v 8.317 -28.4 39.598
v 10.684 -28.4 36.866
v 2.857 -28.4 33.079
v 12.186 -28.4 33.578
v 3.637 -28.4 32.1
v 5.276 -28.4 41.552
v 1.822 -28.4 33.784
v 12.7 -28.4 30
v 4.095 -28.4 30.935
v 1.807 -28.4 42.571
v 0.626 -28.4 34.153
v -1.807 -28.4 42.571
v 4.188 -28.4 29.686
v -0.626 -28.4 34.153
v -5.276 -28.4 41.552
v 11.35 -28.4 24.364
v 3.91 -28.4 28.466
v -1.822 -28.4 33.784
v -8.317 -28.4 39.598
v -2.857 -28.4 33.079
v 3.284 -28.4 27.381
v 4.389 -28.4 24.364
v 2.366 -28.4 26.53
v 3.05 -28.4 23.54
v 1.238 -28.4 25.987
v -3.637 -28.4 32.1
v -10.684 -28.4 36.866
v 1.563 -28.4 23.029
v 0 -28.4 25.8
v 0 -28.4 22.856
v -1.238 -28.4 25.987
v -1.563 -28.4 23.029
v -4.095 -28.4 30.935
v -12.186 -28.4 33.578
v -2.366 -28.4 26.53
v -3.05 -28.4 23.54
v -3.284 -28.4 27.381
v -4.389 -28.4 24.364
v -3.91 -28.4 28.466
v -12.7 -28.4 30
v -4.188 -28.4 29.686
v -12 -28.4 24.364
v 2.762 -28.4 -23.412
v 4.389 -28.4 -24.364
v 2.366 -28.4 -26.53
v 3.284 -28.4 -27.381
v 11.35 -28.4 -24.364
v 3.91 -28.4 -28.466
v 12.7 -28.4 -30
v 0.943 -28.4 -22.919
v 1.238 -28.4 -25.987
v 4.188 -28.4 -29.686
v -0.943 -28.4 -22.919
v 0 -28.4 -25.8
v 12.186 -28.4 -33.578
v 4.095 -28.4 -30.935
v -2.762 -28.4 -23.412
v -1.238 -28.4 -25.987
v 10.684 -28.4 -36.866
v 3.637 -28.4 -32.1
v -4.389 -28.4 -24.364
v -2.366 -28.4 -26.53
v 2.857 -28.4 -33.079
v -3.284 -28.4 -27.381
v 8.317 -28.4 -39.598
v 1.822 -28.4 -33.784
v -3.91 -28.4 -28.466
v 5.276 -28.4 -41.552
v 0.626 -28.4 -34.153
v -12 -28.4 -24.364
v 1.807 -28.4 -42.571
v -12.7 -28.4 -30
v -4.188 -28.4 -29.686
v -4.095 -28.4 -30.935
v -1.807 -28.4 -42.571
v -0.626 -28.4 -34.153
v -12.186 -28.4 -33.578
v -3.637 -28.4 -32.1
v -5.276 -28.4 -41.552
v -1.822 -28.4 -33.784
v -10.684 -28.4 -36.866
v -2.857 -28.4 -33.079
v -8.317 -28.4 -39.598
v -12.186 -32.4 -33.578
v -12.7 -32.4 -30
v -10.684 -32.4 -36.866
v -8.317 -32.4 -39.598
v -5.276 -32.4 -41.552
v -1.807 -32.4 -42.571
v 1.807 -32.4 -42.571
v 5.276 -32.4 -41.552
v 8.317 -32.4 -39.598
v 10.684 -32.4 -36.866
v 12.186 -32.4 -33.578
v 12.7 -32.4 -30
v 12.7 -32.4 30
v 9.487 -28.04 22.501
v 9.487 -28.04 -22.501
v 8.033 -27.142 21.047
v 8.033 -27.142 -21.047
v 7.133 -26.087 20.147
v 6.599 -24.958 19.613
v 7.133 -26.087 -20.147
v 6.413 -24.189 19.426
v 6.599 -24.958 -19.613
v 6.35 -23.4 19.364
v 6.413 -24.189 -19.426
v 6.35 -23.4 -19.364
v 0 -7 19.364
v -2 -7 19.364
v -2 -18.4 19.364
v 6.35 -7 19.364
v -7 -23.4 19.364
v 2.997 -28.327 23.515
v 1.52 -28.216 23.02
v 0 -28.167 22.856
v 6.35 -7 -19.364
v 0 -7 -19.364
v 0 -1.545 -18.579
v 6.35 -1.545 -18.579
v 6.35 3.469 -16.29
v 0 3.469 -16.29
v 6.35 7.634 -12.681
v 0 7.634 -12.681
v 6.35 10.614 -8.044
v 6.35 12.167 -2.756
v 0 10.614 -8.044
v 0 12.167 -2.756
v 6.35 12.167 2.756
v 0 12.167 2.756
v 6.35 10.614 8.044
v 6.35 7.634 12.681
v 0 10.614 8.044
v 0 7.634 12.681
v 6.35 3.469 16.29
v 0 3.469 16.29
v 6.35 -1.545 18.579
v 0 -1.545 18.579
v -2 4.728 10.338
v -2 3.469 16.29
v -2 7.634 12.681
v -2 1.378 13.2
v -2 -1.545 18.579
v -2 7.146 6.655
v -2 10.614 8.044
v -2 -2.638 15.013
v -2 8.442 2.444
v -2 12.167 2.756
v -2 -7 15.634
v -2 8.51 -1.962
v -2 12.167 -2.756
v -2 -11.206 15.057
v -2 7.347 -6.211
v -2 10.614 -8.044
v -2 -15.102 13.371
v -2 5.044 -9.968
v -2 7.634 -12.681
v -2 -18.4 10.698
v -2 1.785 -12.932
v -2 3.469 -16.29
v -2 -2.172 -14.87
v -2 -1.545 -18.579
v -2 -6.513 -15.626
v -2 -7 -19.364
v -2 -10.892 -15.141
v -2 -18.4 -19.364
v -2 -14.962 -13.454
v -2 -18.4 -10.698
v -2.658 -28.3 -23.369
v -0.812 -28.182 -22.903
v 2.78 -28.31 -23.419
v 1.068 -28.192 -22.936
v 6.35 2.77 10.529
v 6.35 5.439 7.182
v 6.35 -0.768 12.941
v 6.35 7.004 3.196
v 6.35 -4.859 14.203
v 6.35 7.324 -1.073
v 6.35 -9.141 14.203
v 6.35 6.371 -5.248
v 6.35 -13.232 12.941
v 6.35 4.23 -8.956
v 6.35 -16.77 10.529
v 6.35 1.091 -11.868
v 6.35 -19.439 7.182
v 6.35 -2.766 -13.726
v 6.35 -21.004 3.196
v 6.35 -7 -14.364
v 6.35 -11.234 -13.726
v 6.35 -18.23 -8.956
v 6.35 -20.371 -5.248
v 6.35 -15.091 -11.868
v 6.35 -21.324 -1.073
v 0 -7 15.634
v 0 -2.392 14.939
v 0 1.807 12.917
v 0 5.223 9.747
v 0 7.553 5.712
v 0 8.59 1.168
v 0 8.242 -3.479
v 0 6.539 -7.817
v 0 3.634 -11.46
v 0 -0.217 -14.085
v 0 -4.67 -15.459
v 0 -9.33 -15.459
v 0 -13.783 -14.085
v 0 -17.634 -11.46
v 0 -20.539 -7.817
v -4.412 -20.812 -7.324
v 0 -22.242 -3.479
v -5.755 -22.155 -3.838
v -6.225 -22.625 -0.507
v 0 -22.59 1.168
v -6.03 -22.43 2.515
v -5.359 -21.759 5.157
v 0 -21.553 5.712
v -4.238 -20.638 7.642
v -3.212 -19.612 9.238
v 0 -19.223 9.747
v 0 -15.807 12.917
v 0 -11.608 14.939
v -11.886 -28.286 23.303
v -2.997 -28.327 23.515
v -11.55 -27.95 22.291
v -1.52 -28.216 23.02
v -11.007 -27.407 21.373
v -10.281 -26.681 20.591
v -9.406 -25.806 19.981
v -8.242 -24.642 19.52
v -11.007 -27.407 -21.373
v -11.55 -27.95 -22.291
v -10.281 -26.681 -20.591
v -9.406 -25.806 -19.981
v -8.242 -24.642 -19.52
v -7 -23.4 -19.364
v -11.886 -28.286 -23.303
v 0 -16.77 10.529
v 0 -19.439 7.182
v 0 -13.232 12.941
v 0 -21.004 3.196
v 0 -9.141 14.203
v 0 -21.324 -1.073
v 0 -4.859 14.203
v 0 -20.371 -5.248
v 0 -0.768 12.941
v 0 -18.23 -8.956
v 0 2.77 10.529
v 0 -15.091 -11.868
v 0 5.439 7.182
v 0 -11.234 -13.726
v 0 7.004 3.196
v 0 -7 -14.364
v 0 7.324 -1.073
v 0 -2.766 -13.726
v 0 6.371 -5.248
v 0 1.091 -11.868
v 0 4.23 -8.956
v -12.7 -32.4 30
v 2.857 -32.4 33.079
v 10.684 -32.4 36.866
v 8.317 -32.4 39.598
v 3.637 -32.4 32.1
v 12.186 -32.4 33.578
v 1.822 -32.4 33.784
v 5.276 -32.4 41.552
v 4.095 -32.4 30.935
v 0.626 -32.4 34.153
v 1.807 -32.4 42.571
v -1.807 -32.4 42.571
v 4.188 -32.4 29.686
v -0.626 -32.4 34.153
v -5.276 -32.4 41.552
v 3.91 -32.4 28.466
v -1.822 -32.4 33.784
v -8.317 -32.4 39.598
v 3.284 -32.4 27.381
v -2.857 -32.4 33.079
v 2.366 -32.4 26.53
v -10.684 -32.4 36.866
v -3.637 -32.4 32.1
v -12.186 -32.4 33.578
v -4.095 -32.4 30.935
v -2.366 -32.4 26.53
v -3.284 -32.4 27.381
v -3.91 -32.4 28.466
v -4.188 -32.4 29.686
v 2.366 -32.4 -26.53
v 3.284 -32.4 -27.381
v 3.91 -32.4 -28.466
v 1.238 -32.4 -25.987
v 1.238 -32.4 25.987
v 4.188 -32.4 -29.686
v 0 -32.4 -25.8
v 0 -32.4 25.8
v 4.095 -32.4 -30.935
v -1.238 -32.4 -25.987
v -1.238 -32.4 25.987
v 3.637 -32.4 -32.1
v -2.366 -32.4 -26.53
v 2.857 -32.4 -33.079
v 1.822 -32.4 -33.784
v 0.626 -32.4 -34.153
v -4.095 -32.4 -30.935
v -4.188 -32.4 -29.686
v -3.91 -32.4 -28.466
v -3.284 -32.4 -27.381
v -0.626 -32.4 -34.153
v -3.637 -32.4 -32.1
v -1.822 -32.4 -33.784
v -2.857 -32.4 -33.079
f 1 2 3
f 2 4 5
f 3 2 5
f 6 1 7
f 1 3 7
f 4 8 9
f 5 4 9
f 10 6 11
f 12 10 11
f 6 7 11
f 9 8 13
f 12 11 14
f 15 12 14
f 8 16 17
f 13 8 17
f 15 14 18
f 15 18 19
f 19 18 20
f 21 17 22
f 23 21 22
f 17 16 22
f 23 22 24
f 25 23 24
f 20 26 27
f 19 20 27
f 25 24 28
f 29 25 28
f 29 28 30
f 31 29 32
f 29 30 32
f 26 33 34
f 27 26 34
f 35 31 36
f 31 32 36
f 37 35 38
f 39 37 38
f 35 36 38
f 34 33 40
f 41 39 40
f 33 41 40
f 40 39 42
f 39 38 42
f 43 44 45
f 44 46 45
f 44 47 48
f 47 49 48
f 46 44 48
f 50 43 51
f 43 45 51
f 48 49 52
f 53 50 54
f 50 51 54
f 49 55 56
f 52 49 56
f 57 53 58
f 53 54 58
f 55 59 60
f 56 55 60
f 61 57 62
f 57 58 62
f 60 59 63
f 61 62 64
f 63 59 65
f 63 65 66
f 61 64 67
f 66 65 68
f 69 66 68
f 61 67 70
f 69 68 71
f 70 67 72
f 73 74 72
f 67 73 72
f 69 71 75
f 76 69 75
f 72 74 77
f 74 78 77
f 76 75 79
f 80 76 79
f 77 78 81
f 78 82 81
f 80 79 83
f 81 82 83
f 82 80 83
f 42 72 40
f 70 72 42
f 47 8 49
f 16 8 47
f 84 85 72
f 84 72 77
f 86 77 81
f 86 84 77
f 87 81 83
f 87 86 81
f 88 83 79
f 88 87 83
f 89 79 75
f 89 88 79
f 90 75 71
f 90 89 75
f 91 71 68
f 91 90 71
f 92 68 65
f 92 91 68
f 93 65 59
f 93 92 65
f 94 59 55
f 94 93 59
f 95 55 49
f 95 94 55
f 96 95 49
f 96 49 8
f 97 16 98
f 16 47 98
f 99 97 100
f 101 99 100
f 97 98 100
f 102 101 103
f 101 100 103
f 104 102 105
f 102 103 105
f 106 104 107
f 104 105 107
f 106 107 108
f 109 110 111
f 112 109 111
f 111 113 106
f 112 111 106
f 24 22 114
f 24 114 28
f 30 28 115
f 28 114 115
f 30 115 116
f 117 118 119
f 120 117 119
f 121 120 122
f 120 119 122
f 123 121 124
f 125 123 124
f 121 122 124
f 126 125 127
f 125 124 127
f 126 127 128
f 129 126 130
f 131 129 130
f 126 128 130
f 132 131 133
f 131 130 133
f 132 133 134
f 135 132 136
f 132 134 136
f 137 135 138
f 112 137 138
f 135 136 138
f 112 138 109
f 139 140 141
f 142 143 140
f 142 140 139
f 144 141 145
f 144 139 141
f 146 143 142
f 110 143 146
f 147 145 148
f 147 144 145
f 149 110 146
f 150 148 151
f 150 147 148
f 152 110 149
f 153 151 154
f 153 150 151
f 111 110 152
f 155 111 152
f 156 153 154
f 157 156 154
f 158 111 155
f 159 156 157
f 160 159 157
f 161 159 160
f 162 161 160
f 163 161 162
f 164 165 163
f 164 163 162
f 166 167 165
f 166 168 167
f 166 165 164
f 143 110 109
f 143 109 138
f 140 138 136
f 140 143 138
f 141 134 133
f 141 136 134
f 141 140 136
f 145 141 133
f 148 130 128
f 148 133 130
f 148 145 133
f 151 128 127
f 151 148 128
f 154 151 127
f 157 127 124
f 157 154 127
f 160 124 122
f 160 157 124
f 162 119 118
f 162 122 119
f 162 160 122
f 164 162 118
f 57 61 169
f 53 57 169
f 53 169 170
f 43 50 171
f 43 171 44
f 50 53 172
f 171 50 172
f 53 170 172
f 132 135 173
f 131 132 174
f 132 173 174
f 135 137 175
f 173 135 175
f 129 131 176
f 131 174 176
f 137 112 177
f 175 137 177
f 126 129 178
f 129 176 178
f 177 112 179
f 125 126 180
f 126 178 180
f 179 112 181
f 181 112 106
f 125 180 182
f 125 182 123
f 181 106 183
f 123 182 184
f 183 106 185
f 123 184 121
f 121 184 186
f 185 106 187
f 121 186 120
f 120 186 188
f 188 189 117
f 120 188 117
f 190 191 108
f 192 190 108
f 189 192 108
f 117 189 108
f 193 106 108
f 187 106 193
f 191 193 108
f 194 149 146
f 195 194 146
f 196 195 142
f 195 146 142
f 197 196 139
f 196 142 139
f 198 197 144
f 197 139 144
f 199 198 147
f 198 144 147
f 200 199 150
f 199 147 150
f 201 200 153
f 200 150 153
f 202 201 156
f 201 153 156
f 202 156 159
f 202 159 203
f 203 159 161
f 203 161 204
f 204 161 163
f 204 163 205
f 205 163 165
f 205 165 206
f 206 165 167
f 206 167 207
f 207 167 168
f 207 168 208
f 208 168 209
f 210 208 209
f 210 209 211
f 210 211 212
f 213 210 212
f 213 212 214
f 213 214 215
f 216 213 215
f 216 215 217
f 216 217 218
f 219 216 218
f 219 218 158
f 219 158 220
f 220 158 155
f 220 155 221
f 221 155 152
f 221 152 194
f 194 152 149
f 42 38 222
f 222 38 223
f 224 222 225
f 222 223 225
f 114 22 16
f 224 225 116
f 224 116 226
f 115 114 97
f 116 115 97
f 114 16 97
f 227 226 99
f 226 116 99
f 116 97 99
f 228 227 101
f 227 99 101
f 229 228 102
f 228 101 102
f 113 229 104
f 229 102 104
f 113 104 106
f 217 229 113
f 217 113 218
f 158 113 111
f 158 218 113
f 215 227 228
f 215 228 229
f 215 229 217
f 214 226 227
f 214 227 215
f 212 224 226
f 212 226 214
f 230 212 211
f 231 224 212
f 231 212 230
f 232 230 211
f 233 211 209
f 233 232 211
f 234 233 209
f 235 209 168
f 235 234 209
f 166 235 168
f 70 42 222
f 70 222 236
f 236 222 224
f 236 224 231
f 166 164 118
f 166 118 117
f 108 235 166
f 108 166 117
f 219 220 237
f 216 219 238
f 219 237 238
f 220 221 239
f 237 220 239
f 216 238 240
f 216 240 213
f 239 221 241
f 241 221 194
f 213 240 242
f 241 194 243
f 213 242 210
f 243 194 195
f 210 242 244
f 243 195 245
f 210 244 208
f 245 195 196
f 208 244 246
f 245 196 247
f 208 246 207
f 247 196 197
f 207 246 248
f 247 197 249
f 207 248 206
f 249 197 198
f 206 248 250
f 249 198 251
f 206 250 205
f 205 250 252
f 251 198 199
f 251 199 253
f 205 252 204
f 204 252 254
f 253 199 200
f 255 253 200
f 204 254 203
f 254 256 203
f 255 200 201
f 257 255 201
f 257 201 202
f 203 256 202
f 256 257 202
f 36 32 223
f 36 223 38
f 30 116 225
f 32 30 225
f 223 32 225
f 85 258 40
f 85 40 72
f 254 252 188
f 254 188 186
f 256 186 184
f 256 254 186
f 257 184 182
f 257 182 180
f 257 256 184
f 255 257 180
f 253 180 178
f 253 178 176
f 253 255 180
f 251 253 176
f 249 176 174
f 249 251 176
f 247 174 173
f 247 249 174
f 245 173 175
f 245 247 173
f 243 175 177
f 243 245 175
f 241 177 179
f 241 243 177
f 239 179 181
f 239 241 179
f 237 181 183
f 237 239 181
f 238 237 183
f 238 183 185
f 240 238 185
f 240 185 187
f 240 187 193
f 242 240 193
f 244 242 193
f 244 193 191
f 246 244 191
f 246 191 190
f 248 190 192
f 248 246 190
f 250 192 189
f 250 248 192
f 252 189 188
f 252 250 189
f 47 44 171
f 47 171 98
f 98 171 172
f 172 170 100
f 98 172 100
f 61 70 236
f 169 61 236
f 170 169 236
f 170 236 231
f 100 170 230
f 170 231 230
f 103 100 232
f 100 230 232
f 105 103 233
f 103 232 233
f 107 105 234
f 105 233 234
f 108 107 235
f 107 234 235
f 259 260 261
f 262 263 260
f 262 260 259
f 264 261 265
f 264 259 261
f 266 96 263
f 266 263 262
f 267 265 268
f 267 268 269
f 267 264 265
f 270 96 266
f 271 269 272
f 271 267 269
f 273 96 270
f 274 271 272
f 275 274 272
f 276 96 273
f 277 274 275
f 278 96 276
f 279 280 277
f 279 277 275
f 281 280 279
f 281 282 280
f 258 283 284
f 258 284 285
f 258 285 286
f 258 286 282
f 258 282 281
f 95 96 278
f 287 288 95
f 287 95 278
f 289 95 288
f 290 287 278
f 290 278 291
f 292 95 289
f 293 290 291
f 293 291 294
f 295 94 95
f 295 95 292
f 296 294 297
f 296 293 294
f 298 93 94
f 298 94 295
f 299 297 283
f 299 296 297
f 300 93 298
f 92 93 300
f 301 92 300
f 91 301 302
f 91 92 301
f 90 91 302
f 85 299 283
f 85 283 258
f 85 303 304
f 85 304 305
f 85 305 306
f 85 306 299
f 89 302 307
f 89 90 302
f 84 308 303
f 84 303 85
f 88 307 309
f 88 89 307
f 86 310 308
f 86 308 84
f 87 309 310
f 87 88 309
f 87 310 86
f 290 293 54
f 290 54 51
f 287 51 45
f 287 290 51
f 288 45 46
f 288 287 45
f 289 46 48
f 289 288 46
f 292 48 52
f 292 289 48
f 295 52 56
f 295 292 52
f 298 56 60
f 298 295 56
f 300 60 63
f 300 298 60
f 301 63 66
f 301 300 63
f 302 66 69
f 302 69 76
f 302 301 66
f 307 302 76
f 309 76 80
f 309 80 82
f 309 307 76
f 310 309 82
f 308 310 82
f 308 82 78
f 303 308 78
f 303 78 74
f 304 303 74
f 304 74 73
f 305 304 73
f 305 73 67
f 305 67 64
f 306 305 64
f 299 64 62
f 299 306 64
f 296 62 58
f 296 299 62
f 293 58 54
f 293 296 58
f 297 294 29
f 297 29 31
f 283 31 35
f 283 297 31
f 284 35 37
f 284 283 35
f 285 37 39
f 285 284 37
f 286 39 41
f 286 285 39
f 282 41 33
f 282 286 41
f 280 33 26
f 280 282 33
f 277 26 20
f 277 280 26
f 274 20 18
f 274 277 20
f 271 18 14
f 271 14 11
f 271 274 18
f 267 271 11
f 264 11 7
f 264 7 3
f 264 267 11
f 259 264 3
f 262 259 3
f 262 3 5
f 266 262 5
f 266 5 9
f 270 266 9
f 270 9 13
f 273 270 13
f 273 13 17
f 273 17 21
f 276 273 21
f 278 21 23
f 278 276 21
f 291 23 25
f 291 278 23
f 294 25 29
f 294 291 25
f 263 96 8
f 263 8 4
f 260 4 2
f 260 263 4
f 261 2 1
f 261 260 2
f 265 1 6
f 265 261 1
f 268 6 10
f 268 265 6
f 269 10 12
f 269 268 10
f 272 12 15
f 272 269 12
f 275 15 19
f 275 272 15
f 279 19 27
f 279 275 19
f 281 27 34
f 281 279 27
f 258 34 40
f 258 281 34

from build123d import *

# Parameters (mm, degrees)
SKETCH1_R                          = 19.3637
SKETCH1_R_2                        = 14.3637
MOTOR_FACE_AND_SCREW_EXTRUDE_DEPTH = 6.35
BOSS_EXTRUDE4_START                = 2
SKETCH7_R                          = 19.3637
SKETCH7_R_2                        = 15.6337
BOSS_EXTRUDE4_DEPTH                = 2
SKETCH3_R                          = 4.2
BOSS_EXTRUDE3_DEPTH                = 4
BOSS_EXTRUDE5_REACH                = 62.384
BOSS_EXTRUDE5_END_RADIUS           = 19.3637
SKETCH8_W                          = 8.35
SKETCH8_H                          = 38.7274
CHAMFER1_SIZE                      = 10
FILLET1_R                          = 5
SKETCH6_W                          = 7.14375
SKETCH6_H                          = 40.7637
F_1_0MM_DOWEL_HOLE1_AT_2_COUNT     = 2
F_1_0MM_DOWEL_HOLE1_AT_2_PITCH     = 60


with BuildPart() as part:
    # Sketch1 → Motor face and screw extrude (new body)
    with BuildSketch(Plane(origin=(0, 0, 0), x_dir=(0, 0, -1), z_dir=(1, 0, 0))):
        with Locations((0, -7)):
            Circle(SKETCH1_R)
        with Locations((0, -7)):
            Circle(SKETCH1_R_2, mode=Mode.SUBTRACT)
    extrude(amount=MOTOR_FACE_AND_SCREW_EXTRUDE_DEPTH)

    # Sketch7 → Boss-Extrude4 (add)
    with BuildSketch(Plane.ZY.offset(BOSS_EXTRUDE4_START)):
        with Locations((0, -7)):
            Circle(SKETCH7_R)
        with Locations((0, -7)):
            Circle(SKETCH7_R_2, mode=Mode.SUBTRACT)
    extrude(amount=-BOSS_EXTRUDE4_DEPTH)



with BuildPart() as body_2:
    # Sketch3 → Boss-Extrude3 (new body)
    with BuildSketch(Plane(origin=(0, -32.4, 0), x_dir=(1, 0, 0), z_dir=(0, 1, 0))):
        with BuildLine():
            Line((-12.7, -30), (-12.7, 30))
            ThreePointArc((-12.7, 30), (0, 42.7), (12.7, 30))
            Line((12.7, 30), (12.7, -30))
            ThreePointArc((12.7, -30), (0, -42.7), (-12.7, -30))
        make_face()
        with Locations(Location((0, 30, 0), (0, 0, 270))):
            Circle(SKETCH3_R, mode=Mode.SUBTRACT)
        with Locations(Location((0, -30, 0), (0, 0, 90))):
            Circle(SKETCH3_R, mode=Mode.SUBTRACT)
    extrude(amount=BOSS_EXTRUDE3_DEPTH)


with BuildPart() as part_1:
    add(part.part)

    add(body_2.part)  # Boss-Extrude5 merges body 2
    # Boss-Extrude5: up to this cylinder (the profile starts outside it)
    boss_extrude5_end = Plane(origin=(2.175, -7, 0), z_dir=(-1, 0, 0)) * Cylinder(BOSS_EXTRUDE5_END_RADIUS, 164.4954, mode=Mode.PRIVATE)
    # Sketch8 → Boss-Extrude5 (add, up to the surface)
    with BuildSketch(Plane(origin=(0, -28.4, 0), x_dir=(1, 0, 0), z_dir=(0, 1, 0)), mode=Mode.PRIVATE) as boss_extrude5_sk1:
        with Locations((2.175, 0)):
            Rectangle(SKETCH8_W, SKETCH8_H)
    boss_extrude5_tool1 = extrude(boss_extrude5_sk1.sketch, amount=BOSS_EXTRUDE5_REACH, mode=Mode.PRIVATE) - boss_extrude5_end
    add(boss_extrude5_tool1.solids().sort_by_distance((2.175, -28.4, 0))[0])

    # Chamfer1
    # the kernel refuses this chamfer: 10 mm, written as the material it adds along each edge
    with BuildSketch(Plane(origin=(-2, -28.4, -19.3637), x_dir=(-0.9996219169112968, -0.027495876610586317, 0), z_dir=(0, 0, 1))) as chamfer1_piece_1_section:
        Polygon((CHAMFER1_SIZE * 0.999621916911, -CHAMFER1_SIZE * 0.0274958766106), (-CHAMFER1_SIZE * 0.0274958766106, -CHAMFER1_SIZE * 0.999621916911), (0, 0), align=None)
    chamfer1_piece_1 = extrude(amount=38.7274, mode=Mode.PRIVATE)
    chamfer1_piece_1 = chamfer1_piece_1 - Plane(origin=(-3.620762983, -7, 0), x_dir=(0, 0, 1), z_dir=(-1, 0, 0)) * Cylinder(15.6337, 118, mode=Mode.PRIVATE)
    add(chamfer1_piece_1)

    # Fillet1
    fillet1_edges = [part_1.edges().sort_by_distance(p)[0] for p in [
        (-2.825, -28.4, -19.3637),
        (6.35, -28.4, 0),
        (-2.825, -28.4, 19.3637),
    ]]
    fillet(fillet1_edges, radius=FILLET1_R)

    # Sketch6 → Ø1.0mm Dowel Hole1 (revolve, cut)
    with BuildSketch(Plane(origin=(0, -28.4, 30), x_dir=(0, 0, -1), z_dir=(1, 0, 0))):
        with Locations((3.571875, 20.38185)):
            Rectangle(SKETCH6_W, SKETCH6_H)
    f_1_0mm_dowel_hole1 = revolve(axis=Axis((0, -34.75, 30), (0, 1, 0)), mode=Mode.SUBTRACT)

    # Ø1.0mm Dowel Hole1 at 2: Ø1.0mm Dowel Hole1 ×2
    with Locations(*[(0, 0, -i * F_1_0MM_DOWEL_HOLE1_AT_2_PITCH) for i in range(1, F_1_0MM_DOWEL_HOLE1_AT_2_COUNT)]):
        add(f_1_0mm_dowel_hole1, mode=Mode.SUBTRACT)


solid = part_1.part
